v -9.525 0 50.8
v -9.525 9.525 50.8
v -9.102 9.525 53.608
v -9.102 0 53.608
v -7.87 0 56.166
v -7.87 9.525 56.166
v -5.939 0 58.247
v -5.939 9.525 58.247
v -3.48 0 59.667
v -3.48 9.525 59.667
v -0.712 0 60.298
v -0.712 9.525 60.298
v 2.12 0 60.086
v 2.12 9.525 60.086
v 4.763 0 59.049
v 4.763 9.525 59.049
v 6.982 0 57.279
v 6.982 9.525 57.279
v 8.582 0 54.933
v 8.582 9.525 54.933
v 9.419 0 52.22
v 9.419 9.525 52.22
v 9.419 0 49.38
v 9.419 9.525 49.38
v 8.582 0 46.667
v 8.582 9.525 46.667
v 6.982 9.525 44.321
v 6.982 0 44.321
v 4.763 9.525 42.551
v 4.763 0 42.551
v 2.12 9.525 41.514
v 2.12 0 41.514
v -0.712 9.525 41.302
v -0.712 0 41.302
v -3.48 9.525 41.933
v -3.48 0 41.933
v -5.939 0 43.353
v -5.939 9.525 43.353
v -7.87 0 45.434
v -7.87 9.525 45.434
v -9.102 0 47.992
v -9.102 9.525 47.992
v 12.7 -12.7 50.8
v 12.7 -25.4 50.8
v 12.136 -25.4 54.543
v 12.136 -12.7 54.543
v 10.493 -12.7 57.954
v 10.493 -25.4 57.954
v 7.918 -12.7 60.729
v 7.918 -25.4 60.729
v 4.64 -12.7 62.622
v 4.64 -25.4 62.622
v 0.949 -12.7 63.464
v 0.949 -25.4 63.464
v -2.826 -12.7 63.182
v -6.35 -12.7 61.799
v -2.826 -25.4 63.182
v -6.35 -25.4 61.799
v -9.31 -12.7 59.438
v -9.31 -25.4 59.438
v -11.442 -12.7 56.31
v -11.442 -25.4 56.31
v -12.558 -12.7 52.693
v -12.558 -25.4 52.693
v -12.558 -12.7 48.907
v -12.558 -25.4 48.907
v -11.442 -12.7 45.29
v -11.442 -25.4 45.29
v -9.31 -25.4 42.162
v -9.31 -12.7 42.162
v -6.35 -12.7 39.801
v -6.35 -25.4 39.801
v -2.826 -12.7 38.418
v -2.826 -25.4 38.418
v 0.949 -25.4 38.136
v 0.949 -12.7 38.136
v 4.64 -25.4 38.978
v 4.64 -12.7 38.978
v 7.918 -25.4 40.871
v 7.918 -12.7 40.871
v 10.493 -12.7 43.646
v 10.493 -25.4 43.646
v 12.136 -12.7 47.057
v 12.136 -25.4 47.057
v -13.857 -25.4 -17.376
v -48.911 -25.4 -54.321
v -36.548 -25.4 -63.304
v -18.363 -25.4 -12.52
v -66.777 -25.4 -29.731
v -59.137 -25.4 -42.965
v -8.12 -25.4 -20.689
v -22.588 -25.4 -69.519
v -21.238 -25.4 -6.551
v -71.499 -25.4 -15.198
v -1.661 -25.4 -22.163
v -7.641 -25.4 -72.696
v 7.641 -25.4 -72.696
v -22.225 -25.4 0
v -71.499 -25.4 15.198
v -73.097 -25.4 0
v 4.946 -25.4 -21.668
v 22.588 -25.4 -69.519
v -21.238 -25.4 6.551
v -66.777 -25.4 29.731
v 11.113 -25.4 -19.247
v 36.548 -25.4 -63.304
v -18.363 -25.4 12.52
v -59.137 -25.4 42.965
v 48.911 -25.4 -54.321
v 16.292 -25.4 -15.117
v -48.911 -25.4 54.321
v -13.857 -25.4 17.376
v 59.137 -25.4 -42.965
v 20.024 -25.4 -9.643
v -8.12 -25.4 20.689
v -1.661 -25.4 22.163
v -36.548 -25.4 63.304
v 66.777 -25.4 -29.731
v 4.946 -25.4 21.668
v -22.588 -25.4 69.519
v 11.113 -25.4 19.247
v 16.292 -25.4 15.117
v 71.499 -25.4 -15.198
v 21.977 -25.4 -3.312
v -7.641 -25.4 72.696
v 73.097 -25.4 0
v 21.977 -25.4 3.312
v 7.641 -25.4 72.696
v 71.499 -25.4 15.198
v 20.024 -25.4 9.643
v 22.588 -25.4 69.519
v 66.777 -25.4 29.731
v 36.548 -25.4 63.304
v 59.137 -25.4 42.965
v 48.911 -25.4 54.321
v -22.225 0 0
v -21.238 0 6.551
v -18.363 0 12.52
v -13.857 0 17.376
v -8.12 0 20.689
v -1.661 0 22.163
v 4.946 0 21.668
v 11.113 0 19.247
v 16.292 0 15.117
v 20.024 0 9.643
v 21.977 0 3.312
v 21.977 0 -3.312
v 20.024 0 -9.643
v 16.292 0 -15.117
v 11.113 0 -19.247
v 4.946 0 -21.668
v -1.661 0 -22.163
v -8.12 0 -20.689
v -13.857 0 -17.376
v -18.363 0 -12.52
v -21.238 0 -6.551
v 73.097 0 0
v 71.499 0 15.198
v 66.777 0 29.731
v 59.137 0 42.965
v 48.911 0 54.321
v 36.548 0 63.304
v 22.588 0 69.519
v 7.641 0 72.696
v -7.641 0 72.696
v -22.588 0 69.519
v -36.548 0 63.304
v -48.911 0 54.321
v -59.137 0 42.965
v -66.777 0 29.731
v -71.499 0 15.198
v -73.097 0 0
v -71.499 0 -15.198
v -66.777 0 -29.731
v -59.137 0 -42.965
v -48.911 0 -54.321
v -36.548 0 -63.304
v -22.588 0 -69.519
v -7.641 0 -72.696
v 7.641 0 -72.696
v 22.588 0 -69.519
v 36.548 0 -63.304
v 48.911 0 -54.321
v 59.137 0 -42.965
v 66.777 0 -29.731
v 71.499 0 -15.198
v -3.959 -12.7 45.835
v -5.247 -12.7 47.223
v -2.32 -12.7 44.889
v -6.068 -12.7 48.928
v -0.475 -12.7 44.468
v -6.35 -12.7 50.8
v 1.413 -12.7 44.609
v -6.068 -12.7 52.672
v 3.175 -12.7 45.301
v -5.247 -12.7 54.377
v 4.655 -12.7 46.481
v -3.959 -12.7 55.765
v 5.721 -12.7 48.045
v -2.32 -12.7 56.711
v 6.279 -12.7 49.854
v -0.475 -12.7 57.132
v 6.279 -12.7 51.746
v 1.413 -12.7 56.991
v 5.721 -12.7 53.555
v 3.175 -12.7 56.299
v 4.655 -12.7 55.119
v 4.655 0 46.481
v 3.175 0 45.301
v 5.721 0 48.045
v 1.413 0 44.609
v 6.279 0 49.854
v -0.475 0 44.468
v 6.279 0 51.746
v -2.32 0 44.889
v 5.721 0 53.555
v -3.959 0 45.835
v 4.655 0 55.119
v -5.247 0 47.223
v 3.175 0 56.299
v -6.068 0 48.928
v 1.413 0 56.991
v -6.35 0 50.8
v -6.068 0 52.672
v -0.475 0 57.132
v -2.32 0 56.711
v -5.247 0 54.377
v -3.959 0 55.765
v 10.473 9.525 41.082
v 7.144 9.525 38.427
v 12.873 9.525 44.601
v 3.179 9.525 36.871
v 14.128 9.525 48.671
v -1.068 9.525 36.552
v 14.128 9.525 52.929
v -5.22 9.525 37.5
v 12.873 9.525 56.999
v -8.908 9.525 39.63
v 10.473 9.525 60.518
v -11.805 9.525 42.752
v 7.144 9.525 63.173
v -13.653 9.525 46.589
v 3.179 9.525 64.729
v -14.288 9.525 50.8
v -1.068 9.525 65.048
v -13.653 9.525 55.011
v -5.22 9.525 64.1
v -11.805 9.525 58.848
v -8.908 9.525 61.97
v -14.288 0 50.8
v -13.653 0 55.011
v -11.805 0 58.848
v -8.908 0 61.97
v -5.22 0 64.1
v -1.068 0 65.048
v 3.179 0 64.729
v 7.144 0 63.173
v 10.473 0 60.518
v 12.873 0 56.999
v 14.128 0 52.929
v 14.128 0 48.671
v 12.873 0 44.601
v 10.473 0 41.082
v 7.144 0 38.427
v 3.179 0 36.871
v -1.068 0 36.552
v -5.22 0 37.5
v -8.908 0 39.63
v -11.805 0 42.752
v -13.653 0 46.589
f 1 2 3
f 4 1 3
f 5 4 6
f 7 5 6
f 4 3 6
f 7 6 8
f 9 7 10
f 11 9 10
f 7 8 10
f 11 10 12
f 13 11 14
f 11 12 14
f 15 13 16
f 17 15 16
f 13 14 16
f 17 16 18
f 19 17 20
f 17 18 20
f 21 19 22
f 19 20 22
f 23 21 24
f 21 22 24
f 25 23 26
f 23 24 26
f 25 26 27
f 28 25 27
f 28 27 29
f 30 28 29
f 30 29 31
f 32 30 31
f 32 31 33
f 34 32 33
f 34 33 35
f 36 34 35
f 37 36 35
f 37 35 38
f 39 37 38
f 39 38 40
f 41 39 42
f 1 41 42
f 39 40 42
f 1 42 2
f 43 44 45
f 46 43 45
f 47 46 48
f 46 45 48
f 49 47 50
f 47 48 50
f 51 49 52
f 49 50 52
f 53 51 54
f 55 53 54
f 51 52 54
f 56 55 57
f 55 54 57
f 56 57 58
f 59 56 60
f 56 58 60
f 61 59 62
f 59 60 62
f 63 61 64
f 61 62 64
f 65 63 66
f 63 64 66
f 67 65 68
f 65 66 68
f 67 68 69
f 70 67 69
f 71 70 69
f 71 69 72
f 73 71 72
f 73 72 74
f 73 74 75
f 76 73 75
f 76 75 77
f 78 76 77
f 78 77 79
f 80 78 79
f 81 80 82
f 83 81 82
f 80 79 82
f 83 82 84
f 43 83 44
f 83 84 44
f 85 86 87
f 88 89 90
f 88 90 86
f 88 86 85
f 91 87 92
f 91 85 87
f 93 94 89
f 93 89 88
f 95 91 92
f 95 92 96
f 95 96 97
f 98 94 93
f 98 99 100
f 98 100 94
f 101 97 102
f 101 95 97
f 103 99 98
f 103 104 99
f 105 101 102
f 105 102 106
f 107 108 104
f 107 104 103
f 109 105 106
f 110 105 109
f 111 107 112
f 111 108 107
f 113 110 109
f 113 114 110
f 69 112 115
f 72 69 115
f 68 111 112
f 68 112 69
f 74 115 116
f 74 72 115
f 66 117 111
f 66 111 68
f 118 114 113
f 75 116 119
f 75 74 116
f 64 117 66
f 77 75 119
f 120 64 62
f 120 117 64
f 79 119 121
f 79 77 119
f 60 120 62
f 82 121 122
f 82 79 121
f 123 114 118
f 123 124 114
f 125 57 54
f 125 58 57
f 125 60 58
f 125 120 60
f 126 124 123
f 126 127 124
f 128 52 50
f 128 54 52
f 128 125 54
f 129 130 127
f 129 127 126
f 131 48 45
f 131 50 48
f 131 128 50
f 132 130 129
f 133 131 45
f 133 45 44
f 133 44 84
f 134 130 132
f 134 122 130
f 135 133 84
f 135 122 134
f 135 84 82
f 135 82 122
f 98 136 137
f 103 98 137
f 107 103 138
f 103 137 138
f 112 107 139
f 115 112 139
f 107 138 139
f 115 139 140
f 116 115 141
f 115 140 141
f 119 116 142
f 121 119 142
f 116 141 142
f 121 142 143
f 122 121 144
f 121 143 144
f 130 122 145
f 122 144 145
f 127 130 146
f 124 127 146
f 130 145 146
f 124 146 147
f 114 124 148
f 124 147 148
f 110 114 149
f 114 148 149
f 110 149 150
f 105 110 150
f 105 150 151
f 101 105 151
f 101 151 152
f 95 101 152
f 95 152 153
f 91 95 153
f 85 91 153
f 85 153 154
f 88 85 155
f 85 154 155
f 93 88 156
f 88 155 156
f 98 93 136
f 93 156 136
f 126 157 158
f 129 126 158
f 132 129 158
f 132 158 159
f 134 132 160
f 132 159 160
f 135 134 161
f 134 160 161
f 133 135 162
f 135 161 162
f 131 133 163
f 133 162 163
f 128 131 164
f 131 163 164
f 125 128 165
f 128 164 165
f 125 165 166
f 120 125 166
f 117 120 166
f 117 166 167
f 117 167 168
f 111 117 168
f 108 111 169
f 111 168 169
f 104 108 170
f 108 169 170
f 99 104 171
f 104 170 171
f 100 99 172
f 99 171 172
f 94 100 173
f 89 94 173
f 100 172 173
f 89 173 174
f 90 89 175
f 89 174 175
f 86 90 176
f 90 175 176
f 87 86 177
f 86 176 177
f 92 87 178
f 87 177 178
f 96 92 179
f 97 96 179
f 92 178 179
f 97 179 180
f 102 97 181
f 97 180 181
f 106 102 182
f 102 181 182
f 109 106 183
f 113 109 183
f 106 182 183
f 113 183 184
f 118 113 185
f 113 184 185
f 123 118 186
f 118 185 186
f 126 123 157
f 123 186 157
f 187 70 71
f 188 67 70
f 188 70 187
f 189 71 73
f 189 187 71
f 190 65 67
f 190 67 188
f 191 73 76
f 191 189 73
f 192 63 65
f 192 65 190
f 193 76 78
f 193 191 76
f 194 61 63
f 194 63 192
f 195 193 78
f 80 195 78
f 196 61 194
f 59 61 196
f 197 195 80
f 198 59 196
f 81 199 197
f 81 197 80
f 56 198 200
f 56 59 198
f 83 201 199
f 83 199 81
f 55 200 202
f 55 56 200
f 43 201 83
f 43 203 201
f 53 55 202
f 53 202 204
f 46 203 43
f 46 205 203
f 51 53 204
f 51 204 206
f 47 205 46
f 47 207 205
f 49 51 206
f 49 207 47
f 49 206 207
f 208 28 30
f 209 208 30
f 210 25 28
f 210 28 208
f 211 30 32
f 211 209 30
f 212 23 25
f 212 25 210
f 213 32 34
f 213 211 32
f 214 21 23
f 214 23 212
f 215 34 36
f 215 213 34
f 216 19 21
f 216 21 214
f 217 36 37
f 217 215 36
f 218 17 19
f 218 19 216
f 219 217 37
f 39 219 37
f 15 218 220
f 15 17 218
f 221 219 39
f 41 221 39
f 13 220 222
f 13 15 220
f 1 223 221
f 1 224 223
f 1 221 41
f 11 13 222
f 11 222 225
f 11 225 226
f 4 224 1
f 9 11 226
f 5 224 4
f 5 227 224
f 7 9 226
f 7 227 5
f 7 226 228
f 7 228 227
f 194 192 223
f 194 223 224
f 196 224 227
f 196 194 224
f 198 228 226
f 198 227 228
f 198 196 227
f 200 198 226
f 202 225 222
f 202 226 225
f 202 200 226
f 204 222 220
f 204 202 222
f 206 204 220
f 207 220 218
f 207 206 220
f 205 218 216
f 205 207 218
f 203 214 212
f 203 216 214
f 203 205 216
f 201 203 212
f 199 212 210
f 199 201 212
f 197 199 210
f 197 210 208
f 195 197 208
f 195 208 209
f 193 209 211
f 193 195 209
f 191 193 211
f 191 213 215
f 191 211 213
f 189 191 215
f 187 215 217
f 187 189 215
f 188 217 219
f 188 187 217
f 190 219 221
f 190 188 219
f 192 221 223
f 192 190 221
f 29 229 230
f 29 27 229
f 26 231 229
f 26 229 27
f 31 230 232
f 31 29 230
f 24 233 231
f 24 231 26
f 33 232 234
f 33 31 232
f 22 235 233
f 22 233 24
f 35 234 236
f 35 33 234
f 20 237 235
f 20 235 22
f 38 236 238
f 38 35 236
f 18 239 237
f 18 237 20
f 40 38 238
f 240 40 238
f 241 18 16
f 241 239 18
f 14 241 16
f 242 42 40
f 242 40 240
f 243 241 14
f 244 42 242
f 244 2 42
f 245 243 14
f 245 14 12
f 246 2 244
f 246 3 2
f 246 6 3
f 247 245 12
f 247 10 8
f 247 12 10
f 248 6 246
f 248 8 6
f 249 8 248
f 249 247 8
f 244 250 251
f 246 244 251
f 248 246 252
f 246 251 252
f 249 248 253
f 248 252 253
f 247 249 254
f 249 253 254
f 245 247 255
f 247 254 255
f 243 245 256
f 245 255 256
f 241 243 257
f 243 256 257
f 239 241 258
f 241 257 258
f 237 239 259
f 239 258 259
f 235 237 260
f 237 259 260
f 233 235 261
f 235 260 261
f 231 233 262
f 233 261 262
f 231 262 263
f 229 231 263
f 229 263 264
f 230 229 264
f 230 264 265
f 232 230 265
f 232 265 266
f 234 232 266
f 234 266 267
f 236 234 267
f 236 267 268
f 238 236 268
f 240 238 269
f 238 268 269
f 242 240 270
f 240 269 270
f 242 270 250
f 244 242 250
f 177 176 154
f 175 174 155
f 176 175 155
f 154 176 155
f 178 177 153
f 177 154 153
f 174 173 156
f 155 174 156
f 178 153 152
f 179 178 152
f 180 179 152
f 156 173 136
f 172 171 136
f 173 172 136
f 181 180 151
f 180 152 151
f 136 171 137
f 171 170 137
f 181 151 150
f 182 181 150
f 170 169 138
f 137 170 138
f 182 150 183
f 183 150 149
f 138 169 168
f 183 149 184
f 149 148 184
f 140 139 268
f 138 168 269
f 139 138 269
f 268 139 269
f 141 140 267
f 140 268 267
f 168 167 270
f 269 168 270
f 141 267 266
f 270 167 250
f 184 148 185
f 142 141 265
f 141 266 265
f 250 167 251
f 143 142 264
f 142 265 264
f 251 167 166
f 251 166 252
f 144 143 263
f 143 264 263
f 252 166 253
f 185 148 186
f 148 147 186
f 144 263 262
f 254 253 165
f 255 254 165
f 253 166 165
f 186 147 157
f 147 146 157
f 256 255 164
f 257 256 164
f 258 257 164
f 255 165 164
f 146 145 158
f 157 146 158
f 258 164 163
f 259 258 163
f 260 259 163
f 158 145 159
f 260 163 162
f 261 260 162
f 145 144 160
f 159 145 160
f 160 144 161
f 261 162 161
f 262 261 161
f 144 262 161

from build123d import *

# Parameters (mm, degrees)
F0_R      = 73.096751
F1_DEPTH  = 25.4
F2_R      = 6.35
F3_DEPTH  = 25.4
F4_R      = 14.2875
F4_R_2    = 6.35
F5_DEPTH  = 9.525
F6_R      = 9.525
F7_DEPTH  = 9.525
F8_R      = 22.225
F9_DEPTH  = 25.4
F10_R     = 12.7
F11_DEPTH = 12.7


with BuildPart() as f1:
    # F0 (on Front) → F1 (new body)
    with BuildSketch(Plane.XZ):
        Circle(F0_R)
    extrude(amount=F1_DEPTH)

    # F2 (on face) → F3 (cut)
    with BuildSketch(Plane(origin=(0, 0, 0), x_dir=(-1, 0, 0), z_dir=(0, 1, 0))):
        with Locations((0, 50.8)):
            Circle(F2_R)
    extrude(amount=-F3_DEPTH, mode=Mode.SUBTRACT)

    # F4 (on face) → F5 (join)
    with BuildSketch(Plane(origin=(0, 0, 0), x_dir=(-1, 0, 0), z_dir=(0, 1, 0))):
        with Locations((0, 50.8)):
            Circle(F4_R)
        with Locations((0, 50.8)):
            Circle(F4_R_2, mode=Mode.SUBTRACT)
    extrude(amount=F5_DEPTH)

    # F6 (on face) → F7 (cut)
    with BuildSketch(Plane(origin=(0, 9.525, 0), x_dir=(-1, 0, 0), z_dir=(0, 1, 0))):
        with Locations((0, 50.8)):
            Circle(F6_R)
    extrude(amount=-F7_DEPTH, mode=Mode.SUBTRACT)

    # F8 (on face) → F9 (cut)
    with BuildSketch(Plane(origin=(0, 0, 0), x_dir=(-1, 0, 0), z_dir=(0, 1, 0))):
        Circle(F8_R)
    extrude(amount=-F9_DEPTH, mode=Mode.SUBTRACT)

    # F10 (on face) → F11 (cut)
    with BuildSketch(Plane.XZ.offset(25.4)):
        with Locations((0, 50.8)):
            Circle(F10_R)
    extrude(amount=-F11_DEPTH, mode=Mode.SUBTRACT)


solid = f1.part
